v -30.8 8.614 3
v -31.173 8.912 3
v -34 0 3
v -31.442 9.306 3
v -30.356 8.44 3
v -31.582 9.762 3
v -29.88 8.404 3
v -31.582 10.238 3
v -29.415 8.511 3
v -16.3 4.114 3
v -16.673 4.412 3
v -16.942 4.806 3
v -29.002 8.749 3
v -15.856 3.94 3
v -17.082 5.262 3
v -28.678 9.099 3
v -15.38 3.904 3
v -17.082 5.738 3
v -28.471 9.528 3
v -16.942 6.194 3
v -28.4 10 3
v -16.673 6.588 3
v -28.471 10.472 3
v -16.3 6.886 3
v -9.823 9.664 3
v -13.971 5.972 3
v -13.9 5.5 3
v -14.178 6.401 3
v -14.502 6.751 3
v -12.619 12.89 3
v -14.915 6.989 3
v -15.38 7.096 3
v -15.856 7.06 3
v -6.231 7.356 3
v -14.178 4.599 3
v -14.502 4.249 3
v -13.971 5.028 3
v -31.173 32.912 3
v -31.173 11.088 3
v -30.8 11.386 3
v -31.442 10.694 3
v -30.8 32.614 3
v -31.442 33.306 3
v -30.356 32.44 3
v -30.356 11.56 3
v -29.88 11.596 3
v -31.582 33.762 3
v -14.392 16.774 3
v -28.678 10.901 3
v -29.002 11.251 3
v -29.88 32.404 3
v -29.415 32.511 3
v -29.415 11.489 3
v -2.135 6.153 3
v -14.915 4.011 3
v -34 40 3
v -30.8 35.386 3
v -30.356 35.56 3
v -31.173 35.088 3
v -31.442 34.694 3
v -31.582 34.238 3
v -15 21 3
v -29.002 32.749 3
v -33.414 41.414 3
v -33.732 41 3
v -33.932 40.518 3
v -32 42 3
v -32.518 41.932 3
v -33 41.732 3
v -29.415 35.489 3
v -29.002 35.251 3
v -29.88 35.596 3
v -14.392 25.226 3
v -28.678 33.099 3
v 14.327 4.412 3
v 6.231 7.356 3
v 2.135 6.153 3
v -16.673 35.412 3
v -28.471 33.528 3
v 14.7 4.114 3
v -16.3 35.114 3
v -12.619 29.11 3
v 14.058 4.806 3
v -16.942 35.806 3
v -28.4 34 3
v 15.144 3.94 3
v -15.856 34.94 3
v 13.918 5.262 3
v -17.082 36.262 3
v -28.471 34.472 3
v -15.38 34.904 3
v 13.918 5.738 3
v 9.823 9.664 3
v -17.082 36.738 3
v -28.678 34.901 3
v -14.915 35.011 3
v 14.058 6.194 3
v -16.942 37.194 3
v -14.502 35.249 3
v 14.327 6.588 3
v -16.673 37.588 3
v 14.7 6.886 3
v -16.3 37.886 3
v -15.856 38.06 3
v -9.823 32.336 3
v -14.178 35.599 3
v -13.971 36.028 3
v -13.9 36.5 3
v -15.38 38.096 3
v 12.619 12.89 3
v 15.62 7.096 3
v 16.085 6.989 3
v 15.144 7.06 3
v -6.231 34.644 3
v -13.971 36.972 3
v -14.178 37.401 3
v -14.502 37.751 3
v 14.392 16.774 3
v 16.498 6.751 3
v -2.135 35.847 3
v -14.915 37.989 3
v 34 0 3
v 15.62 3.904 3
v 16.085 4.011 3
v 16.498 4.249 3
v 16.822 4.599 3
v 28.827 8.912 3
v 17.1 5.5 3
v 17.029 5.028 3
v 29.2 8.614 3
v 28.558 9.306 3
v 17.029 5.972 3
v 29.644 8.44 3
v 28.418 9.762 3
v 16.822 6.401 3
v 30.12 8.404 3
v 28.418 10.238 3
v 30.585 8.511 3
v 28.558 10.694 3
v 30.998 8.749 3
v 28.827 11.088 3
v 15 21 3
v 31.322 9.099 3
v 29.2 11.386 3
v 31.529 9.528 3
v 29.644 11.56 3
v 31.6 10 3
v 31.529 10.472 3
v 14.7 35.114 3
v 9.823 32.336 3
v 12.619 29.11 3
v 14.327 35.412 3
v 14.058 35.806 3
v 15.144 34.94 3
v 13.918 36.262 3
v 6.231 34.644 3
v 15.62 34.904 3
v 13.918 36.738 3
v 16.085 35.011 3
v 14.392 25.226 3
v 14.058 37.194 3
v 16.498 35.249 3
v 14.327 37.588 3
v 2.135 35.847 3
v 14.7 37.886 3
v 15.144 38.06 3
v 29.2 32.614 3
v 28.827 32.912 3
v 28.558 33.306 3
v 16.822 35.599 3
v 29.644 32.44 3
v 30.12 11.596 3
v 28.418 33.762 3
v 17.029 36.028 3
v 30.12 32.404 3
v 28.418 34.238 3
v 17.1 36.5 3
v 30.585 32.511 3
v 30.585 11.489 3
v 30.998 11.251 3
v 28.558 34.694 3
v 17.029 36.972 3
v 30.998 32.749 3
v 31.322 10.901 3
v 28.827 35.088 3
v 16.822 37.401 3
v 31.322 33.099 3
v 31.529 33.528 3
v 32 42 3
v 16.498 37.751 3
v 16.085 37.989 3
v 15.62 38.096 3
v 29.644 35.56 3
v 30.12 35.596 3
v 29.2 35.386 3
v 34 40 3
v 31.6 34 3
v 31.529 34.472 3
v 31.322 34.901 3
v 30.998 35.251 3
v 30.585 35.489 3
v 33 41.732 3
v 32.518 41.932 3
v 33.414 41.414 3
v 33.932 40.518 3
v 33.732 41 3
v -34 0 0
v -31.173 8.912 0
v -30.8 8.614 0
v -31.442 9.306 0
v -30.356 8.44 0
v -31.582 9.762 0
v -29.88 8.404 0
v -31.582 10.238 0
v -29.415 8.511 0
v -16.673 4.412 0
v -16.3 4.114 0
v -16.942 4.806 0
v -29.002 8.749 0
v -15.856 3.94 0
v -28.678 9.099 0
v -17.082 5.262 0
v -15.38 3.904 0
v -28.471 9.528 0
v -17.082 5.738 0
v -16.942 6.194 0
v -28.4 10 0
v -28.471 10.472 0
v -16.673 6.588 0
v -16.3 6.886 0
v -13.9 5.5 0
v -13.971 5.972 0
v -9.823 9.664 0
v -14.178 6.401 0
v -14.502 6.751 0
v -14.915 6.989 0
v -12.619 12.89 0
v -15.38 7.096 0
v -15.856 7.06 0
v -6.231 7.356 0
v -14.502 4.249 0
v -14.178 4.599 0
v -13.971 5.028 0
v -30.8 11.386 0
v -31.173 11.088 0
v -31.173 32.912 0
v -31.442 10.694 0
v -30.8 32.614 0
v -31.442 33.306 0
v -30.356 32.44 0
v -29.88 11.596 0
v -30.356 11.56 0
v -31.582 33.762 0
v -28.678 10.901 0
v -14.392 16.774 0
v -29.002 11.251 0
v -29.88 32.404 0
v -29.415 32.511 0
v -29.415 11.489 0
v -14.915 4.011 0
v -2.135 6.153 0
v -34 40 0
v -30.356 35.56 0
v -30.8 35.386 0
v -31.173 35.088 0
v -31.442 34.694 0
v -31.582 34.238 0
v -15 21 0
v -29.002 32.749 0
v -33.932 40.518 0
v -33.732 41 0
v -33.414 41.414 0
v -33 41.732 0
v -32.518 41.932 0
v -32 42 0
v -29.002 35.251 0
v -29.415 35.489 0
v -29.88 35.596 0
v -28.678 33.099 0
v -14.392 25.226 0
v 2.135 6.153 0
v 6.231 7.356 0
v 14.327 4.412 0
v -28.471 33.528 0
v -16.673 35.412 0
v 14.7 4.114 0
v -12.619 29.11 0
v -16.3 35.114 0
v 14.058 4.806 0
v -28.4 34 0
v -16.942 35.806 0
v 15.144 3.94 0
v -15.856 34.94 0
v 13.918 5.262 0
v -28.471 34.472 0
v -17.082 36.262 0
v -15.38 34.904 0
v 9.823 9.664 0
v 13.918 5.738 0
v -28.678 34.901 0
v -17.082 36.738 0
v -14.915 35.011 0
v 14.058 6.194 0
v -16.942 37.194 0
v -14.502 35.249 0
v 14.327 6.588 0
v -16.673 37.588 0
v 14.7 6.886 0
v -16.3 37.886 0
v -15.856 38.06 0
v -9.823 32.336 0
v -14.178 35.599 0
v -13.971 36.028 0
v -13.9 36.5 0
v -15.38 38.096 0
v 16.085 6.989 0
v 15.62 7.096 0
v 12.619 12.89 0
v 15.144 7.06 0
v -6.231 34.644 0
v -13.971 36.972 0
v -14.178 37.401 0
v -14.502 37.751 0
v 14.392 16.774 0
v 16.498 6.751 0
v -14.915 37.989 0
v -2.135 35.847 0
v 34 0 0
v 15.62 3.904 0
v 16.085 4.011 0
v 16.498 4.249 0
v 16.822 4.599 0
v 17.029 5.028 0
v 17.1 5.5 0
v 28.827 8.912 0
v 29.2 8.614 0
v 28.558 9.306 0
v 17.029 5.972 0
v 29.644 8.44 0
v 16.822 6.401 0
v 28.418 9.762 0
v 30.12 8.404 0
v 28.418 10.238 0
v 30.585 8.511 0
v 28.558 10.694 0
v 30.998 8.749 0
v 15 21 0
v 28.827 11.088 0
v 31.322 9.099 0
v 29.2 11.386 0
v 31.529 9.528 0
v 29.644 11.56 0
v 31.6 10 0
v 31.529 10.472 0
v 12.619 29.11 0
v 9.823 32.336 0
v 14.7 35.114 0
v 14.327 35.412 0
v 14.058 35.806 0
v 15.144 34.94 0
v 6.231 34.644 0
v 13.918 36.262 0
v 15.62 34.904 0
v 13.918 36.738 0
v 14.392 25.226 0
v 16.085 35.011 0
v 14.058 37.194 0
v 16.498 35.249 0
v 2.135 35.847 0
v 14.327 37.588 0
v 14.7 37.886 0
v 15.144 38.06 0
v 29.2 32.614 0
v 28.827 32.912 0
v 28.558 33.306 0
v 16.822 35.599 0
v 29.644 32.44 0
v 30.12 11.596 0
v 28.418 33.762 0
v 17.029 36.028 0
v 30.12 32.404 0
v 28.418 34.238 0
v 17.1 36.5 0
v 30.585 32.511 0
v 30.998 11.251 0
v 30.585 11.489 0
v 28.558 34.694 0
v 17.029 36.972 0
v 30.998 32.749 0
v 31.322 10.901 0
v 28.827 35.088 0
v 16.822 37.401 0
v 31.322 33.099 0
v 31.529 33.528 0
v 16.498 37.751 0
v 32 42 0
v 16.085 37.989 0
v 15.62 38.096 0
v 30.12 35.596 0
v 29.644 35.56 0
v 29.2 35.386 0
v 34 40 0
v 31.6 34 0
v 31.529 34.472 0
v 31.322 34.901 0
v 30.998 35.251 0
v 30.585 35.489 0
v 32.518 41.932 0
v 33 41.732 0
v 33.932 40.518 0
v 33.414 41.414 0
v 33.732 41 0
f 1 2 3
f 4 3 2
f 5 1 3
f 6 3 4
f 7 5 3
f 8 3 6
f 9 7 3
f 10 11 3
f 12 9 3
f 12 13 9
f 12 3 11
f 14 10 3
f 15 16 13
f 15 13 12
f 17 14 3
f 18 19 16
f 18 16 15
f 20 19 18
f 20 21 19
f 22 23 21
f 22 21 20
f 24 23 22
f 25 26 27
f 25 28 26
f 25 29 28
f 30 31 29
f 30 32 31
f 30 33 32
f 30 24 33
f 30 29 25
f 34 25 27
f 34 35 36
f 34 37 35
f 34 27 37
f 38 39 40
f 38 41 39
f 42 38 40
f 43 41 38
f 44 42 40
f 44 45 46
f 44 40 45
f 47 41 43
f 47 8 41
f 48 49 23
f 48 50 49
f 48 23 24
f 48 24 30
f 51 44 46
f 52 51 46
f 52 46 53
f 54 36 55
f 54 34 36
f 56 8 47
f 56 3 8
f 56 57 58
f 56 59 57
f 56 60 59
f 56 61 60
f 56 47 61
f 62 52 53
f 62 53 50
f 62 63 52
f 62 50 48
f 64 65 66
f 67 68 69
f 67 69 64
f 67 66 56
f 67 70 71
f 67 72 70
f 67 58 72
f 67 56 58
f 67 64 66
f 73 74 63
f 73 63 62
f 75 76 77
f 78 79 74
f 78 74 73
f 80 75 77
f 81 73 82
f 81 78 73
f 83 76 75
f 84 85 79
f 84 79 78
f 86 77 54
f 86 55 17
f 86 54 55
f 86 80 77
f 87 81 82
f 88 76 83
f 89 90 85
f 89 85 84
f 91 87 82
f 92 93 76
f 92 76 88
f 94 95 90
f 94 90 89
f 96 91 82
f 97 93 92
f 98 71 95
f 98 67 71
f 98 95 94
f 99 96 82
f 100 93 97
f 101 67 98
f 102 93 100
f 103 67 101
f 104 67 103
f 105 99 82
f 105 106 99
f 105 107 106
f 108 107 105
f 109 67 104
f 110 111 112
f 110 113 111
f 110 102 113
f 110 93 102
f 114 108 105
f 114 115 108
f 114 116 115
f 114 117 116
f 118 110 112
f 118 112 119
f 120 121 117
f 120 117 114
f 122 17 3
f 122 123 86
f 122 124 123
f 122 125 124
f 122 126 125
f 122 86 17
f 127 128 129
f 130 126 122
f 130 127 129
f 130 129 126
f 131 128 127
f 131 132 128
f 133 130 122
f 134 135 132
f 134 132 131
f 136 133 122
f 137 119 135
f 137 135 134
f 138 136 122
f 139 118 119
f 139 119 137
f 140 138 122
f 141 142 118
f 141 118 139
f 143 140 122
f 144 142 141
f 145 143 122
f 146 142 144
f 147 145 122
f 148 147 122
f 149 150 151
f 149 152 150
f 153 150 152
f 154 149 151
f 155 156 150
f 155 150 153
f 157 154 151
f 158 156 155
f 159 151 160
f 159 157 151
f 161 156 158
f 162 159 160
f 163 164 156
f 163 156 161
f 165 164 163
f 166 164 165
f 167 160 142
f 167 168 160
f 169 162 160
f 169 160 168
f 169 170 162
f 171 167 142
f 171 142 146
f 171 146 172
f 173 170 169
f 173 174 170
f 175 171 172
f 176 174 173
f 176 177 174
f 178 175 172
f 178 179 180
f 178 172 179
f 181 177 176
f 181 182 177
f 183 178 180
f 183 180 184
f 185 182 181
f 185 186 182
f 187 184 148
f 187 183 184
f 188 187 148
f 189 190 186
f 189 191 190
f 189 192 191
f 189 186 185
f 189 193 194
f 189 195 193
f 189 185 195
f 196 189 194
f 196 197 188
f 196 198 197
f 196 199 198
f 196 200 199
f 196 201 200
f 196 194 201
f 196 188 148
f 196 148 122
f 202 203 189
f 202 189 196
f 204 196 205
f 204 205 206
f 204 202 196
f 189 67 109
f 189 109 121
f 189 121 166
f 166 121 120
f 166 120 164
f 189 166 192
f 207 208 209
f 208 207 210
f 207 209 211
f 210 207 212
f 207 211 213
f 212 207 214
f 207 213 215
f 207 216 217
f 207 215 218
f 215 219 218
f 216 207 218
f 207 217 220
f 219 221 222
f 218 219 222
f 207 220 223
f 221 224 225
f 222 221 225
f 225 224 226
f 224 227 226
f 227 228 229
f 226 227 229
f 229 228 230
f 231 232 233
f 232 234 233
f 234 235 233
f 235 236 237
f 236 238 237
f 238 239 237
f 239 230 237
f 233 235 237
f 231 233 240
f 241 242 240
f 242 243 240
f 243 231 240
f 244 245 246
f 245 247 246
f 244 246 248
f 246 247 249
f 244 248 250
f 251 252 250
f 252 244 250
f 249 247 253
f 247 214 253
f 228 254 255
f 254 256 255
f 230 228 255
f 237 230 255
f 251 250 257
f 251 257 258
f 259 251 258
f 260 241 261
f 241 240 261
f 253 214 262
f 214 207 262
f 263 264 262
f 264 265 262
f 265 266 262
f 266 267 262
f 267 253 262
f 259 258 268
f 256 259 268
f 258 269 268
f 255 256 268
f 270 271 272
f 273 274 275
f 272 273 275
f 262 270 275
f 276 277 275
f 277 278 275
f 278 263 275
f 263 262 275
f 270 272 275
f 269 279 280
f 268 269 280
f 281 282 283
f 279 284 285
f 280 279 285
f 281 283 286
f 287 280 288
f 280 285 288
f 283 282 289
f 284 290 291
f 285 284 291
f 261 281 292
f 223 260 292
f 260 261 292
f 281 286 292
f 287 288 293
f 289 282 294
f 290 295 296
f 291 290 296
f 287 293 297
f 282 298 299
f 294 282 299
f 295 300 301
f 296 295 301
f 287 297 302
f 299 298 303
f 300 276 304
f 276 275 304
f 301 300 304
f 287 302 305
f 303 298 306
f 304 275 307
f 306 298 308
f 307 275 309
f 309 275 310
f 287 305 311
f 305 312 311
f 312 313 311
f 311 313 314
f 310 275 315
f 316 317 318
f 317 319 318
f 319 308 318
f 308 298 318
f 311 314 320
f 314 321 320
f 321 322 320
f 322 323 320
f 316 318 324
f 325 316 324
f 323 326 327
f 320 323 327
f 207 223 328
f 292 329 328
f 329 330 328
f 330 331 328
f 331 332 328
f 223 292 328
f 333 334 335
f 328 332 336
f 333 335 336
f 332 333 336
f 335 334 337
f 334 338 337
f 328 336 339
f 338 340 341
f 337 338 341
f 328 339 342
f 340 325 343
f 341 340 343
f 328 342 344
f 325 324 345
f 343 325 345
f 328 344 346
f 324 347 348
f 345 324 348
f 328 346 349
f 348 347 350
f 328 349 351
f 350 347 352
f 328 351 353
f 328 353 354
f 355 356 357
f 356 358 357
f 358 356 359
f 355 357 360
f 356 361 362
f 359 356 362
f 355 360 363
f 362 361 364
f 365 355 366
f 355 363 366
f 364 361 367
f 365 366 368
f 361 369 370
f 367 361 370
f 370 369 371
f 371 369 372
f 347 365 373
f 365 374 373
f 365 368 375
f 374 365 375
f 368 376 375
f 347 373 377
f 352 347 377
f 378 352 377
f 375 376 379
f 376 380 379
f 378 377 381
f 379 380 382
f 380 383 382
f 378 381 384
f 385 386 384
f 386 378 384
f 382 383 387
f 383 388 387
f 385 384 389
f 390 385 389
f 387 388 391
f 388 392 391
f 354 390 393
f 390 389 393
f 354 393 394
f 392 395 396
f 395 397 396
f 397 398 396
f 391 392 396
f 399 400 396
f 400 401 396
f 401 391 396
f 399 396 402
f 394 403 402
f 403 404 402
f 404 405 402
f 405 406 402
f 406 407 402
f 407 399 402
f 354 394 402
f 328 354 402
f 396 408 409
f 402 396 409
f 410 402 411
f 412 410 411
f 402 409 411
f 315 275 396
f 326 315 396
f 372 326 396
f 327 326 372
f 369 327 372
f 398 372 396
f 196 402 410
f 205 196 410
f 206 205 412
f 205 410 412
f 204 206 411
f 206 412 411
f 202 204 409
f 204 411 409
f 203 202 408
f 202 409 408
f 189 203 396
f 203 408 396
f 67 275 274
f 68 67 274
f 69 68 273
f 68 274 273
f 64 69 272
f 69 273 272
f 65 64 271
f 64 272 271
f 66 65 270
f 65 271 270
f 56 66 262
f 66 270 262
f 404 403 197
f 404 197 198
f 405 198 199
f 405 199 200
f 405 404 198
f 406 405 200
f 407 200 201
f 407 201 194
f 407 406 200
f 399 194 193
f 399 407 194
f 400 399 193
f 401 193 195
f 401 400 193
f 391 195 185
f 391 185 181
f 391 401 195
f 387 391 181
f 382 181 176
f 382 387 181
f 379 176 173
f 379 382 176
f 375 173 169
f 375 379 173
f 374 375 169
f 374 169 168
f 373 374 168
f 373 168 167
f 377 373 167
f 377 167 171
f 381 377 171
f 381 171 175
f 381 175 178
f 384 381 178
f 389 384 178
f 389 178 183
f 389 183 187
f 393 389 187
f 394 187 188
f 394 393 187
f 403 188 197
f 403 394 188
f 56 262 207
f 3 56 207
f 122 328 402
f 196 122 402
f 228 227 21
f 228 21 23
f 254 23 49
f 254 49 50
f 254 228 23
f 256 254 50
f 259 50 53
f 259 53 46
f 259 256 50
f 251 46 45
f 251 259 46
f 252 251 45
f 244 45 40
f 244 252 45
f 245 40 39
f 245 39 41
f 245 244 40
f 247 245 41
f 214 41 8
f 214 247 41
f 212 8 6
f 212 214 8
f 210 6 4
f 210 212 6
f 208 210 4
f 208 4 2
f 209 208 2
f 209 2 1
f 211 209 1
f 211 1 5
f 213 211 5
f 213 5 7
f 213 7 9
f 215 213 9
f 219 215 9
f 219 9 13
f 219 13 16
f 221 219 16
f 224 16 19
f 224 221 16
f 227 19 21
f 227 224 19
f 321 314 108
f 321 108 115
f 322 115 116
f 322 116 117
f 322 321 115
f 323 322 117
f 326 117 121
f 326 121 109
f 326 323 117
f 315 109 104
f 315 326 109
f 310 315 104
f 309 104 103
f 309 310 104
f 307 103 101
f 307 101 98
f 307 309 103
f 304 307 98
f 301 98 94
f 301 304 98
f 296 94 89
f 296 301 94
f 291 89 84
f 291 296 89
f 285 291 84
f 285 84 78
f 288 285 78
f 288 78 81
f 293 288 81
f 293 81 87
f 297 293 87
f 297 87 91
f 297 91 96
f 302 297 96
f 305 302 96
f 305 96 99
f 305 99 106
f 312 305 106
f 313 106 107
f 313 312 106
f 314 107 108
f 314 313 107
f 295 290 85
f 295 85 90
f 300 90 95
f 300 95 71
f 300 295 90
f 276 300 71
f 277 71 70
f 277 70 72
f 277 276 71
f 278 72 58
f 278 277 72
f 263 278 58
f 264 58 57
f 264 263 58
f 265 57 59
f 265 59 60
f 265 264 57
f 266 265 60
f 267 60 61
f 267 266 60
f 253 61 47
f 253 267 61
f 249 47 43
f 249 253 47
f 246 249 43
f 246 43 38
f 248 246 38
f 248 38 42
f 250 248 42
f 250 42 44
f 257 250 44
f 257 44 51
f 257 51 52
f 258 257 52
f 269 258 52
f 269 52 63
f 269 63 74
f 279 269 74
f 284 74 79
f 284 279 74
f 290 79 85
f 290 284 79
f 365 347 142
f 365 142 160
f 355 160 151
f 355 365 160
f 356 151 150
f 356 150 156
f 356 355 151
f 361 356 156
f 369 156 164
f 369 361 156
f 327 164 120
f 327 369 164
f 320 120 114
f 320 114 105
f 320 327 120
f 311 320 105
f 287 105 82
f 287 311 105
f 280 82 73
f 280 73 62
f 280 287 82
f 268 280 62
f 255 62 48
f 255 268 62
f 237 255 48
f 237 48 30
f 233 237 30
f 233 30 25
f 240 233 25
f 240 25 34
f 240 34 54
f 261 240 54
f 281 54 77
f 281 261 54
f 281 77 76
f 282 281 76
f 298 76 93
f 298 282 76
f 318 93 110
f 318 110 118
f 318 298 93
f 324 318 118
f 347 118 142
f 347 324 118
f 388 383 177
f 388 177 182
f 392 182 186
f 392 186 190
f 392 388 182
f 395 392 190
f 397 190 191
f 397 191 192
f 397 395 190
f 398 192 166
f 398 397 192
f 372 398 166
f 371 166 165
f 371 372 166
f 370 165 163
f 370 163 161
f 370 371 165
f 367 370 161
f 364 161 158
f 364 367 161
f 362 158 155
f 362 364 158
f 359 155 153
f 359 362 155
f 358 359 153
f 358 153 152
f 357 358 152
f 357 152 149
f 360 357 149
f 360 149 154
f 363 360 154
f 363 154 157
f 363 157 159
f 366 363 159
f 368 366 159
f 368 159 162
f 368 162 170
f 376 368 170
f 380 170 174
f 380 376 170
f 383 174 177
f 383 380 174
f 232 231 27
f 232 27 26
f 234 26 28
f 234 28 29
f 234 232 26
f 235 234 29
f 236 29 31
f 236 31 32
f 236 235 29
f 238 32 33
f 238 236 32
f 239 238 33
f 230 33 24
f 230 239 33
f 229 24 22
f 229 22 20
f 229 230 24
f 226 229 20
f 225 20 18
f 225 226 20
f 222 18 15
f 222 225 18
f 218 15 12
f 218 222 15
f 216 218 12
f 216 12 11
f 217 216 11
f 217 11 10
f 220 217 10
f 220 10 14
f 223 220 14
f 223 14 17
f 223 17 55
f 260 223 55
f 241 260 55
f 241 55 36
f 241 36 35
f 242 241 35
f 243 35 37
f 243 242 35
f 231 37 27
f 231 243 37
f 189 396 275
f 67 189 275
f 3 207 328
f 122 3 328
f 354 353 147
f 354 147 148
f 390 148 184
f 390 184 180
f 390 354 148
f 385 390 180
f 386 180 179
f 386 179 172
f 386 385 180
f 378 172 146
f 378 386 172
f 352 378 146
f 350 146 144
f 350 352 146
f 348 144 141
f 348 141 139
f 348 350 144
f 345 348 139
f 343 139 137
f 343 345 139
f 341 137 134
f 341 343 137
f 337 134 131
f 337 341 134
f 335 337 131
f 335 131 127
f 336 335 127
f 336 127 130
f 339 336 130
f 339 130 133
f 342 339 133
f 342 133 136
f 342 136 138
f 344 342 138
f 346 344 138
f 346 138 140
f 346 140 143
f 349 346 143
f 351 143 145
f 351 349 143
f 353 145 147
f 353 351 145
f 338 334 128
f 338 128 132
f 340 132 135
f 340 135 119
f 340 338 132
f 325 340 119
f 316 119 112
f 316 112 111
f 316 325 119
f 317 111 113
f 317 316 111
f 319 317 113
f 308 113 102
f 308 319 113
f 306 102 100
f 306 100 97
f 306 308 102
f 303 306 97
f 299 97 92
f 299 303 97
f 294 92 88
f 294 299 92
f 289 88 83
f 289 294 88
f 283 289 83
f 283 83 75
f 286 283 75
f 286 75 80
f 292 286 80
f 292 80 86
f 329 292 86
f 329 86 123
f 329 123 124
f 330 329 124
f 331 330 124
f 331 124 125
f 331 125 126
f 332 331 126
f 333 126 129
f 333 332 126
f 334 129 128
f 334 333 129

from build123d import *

# Parameters (mm, degrees)
SKETCH_1_R      = 1.6
SKETCH_1_R_2    = 15
EXTRUDE_1_DEPTH = 3


with BuildPart() as part:
    # 草图1 → 凸台-拉伸1 (new body)
    with BuildSketch(Plane.XY):
        with BuildLine():
            Line((-34, 0), (34, 0))
            Line((34, 0), (34, 40))
            ThreePointArc((34, 40), (33.414213562, 41.414213562), (32, 42))
            Line((32, 42), (-32, 42))
            ThreePointArc((-32, 42), (-33.414213562, 41.414213562), (-34, 40))
            Line((-34, 40), (-34, 0))
        make_face()
        with Locations((15.5, 5.5)):
            Circle(SKETCH_1_R, mode=Mode.SUBTRACT)
        with Locations((-15.5, 5.5)):
            Circle(SKETCH_1_R, mode=Mode.SUBTRACT)
        with Locations((-15.5, 36.5)):
            Circle(SKETCH_1_R, mode=Mode.SUBTRACT)
        with Locations((15.5, 36.5)):
            Circle(SKETCH_1_R, mode=Mode.SUBTRACT)
        with Locations((30, 34)):
            Circle(SKETCH_1_R, mode=Mode.SUBTRACT)
        with Locations((30, 10)):
            Circle(SKETCH_1_R, mode=Mode.SUBTRACT)
        with Locations((-30, 10)):
            Circle(SKETCH_1_R, mode=Mode.SUBTRACT)
        with Locations((-30, 34)):
            Circle(SKETCH_1_R, mode=Mode.SUBTRACT)
        with Locations((0, 21)):
            Circle(SKETCH_1_R_2, mode=Mode.SUBTRACT)
    extrude(amount=EXTRUDE_1_DEPTH)


solid = part.part
